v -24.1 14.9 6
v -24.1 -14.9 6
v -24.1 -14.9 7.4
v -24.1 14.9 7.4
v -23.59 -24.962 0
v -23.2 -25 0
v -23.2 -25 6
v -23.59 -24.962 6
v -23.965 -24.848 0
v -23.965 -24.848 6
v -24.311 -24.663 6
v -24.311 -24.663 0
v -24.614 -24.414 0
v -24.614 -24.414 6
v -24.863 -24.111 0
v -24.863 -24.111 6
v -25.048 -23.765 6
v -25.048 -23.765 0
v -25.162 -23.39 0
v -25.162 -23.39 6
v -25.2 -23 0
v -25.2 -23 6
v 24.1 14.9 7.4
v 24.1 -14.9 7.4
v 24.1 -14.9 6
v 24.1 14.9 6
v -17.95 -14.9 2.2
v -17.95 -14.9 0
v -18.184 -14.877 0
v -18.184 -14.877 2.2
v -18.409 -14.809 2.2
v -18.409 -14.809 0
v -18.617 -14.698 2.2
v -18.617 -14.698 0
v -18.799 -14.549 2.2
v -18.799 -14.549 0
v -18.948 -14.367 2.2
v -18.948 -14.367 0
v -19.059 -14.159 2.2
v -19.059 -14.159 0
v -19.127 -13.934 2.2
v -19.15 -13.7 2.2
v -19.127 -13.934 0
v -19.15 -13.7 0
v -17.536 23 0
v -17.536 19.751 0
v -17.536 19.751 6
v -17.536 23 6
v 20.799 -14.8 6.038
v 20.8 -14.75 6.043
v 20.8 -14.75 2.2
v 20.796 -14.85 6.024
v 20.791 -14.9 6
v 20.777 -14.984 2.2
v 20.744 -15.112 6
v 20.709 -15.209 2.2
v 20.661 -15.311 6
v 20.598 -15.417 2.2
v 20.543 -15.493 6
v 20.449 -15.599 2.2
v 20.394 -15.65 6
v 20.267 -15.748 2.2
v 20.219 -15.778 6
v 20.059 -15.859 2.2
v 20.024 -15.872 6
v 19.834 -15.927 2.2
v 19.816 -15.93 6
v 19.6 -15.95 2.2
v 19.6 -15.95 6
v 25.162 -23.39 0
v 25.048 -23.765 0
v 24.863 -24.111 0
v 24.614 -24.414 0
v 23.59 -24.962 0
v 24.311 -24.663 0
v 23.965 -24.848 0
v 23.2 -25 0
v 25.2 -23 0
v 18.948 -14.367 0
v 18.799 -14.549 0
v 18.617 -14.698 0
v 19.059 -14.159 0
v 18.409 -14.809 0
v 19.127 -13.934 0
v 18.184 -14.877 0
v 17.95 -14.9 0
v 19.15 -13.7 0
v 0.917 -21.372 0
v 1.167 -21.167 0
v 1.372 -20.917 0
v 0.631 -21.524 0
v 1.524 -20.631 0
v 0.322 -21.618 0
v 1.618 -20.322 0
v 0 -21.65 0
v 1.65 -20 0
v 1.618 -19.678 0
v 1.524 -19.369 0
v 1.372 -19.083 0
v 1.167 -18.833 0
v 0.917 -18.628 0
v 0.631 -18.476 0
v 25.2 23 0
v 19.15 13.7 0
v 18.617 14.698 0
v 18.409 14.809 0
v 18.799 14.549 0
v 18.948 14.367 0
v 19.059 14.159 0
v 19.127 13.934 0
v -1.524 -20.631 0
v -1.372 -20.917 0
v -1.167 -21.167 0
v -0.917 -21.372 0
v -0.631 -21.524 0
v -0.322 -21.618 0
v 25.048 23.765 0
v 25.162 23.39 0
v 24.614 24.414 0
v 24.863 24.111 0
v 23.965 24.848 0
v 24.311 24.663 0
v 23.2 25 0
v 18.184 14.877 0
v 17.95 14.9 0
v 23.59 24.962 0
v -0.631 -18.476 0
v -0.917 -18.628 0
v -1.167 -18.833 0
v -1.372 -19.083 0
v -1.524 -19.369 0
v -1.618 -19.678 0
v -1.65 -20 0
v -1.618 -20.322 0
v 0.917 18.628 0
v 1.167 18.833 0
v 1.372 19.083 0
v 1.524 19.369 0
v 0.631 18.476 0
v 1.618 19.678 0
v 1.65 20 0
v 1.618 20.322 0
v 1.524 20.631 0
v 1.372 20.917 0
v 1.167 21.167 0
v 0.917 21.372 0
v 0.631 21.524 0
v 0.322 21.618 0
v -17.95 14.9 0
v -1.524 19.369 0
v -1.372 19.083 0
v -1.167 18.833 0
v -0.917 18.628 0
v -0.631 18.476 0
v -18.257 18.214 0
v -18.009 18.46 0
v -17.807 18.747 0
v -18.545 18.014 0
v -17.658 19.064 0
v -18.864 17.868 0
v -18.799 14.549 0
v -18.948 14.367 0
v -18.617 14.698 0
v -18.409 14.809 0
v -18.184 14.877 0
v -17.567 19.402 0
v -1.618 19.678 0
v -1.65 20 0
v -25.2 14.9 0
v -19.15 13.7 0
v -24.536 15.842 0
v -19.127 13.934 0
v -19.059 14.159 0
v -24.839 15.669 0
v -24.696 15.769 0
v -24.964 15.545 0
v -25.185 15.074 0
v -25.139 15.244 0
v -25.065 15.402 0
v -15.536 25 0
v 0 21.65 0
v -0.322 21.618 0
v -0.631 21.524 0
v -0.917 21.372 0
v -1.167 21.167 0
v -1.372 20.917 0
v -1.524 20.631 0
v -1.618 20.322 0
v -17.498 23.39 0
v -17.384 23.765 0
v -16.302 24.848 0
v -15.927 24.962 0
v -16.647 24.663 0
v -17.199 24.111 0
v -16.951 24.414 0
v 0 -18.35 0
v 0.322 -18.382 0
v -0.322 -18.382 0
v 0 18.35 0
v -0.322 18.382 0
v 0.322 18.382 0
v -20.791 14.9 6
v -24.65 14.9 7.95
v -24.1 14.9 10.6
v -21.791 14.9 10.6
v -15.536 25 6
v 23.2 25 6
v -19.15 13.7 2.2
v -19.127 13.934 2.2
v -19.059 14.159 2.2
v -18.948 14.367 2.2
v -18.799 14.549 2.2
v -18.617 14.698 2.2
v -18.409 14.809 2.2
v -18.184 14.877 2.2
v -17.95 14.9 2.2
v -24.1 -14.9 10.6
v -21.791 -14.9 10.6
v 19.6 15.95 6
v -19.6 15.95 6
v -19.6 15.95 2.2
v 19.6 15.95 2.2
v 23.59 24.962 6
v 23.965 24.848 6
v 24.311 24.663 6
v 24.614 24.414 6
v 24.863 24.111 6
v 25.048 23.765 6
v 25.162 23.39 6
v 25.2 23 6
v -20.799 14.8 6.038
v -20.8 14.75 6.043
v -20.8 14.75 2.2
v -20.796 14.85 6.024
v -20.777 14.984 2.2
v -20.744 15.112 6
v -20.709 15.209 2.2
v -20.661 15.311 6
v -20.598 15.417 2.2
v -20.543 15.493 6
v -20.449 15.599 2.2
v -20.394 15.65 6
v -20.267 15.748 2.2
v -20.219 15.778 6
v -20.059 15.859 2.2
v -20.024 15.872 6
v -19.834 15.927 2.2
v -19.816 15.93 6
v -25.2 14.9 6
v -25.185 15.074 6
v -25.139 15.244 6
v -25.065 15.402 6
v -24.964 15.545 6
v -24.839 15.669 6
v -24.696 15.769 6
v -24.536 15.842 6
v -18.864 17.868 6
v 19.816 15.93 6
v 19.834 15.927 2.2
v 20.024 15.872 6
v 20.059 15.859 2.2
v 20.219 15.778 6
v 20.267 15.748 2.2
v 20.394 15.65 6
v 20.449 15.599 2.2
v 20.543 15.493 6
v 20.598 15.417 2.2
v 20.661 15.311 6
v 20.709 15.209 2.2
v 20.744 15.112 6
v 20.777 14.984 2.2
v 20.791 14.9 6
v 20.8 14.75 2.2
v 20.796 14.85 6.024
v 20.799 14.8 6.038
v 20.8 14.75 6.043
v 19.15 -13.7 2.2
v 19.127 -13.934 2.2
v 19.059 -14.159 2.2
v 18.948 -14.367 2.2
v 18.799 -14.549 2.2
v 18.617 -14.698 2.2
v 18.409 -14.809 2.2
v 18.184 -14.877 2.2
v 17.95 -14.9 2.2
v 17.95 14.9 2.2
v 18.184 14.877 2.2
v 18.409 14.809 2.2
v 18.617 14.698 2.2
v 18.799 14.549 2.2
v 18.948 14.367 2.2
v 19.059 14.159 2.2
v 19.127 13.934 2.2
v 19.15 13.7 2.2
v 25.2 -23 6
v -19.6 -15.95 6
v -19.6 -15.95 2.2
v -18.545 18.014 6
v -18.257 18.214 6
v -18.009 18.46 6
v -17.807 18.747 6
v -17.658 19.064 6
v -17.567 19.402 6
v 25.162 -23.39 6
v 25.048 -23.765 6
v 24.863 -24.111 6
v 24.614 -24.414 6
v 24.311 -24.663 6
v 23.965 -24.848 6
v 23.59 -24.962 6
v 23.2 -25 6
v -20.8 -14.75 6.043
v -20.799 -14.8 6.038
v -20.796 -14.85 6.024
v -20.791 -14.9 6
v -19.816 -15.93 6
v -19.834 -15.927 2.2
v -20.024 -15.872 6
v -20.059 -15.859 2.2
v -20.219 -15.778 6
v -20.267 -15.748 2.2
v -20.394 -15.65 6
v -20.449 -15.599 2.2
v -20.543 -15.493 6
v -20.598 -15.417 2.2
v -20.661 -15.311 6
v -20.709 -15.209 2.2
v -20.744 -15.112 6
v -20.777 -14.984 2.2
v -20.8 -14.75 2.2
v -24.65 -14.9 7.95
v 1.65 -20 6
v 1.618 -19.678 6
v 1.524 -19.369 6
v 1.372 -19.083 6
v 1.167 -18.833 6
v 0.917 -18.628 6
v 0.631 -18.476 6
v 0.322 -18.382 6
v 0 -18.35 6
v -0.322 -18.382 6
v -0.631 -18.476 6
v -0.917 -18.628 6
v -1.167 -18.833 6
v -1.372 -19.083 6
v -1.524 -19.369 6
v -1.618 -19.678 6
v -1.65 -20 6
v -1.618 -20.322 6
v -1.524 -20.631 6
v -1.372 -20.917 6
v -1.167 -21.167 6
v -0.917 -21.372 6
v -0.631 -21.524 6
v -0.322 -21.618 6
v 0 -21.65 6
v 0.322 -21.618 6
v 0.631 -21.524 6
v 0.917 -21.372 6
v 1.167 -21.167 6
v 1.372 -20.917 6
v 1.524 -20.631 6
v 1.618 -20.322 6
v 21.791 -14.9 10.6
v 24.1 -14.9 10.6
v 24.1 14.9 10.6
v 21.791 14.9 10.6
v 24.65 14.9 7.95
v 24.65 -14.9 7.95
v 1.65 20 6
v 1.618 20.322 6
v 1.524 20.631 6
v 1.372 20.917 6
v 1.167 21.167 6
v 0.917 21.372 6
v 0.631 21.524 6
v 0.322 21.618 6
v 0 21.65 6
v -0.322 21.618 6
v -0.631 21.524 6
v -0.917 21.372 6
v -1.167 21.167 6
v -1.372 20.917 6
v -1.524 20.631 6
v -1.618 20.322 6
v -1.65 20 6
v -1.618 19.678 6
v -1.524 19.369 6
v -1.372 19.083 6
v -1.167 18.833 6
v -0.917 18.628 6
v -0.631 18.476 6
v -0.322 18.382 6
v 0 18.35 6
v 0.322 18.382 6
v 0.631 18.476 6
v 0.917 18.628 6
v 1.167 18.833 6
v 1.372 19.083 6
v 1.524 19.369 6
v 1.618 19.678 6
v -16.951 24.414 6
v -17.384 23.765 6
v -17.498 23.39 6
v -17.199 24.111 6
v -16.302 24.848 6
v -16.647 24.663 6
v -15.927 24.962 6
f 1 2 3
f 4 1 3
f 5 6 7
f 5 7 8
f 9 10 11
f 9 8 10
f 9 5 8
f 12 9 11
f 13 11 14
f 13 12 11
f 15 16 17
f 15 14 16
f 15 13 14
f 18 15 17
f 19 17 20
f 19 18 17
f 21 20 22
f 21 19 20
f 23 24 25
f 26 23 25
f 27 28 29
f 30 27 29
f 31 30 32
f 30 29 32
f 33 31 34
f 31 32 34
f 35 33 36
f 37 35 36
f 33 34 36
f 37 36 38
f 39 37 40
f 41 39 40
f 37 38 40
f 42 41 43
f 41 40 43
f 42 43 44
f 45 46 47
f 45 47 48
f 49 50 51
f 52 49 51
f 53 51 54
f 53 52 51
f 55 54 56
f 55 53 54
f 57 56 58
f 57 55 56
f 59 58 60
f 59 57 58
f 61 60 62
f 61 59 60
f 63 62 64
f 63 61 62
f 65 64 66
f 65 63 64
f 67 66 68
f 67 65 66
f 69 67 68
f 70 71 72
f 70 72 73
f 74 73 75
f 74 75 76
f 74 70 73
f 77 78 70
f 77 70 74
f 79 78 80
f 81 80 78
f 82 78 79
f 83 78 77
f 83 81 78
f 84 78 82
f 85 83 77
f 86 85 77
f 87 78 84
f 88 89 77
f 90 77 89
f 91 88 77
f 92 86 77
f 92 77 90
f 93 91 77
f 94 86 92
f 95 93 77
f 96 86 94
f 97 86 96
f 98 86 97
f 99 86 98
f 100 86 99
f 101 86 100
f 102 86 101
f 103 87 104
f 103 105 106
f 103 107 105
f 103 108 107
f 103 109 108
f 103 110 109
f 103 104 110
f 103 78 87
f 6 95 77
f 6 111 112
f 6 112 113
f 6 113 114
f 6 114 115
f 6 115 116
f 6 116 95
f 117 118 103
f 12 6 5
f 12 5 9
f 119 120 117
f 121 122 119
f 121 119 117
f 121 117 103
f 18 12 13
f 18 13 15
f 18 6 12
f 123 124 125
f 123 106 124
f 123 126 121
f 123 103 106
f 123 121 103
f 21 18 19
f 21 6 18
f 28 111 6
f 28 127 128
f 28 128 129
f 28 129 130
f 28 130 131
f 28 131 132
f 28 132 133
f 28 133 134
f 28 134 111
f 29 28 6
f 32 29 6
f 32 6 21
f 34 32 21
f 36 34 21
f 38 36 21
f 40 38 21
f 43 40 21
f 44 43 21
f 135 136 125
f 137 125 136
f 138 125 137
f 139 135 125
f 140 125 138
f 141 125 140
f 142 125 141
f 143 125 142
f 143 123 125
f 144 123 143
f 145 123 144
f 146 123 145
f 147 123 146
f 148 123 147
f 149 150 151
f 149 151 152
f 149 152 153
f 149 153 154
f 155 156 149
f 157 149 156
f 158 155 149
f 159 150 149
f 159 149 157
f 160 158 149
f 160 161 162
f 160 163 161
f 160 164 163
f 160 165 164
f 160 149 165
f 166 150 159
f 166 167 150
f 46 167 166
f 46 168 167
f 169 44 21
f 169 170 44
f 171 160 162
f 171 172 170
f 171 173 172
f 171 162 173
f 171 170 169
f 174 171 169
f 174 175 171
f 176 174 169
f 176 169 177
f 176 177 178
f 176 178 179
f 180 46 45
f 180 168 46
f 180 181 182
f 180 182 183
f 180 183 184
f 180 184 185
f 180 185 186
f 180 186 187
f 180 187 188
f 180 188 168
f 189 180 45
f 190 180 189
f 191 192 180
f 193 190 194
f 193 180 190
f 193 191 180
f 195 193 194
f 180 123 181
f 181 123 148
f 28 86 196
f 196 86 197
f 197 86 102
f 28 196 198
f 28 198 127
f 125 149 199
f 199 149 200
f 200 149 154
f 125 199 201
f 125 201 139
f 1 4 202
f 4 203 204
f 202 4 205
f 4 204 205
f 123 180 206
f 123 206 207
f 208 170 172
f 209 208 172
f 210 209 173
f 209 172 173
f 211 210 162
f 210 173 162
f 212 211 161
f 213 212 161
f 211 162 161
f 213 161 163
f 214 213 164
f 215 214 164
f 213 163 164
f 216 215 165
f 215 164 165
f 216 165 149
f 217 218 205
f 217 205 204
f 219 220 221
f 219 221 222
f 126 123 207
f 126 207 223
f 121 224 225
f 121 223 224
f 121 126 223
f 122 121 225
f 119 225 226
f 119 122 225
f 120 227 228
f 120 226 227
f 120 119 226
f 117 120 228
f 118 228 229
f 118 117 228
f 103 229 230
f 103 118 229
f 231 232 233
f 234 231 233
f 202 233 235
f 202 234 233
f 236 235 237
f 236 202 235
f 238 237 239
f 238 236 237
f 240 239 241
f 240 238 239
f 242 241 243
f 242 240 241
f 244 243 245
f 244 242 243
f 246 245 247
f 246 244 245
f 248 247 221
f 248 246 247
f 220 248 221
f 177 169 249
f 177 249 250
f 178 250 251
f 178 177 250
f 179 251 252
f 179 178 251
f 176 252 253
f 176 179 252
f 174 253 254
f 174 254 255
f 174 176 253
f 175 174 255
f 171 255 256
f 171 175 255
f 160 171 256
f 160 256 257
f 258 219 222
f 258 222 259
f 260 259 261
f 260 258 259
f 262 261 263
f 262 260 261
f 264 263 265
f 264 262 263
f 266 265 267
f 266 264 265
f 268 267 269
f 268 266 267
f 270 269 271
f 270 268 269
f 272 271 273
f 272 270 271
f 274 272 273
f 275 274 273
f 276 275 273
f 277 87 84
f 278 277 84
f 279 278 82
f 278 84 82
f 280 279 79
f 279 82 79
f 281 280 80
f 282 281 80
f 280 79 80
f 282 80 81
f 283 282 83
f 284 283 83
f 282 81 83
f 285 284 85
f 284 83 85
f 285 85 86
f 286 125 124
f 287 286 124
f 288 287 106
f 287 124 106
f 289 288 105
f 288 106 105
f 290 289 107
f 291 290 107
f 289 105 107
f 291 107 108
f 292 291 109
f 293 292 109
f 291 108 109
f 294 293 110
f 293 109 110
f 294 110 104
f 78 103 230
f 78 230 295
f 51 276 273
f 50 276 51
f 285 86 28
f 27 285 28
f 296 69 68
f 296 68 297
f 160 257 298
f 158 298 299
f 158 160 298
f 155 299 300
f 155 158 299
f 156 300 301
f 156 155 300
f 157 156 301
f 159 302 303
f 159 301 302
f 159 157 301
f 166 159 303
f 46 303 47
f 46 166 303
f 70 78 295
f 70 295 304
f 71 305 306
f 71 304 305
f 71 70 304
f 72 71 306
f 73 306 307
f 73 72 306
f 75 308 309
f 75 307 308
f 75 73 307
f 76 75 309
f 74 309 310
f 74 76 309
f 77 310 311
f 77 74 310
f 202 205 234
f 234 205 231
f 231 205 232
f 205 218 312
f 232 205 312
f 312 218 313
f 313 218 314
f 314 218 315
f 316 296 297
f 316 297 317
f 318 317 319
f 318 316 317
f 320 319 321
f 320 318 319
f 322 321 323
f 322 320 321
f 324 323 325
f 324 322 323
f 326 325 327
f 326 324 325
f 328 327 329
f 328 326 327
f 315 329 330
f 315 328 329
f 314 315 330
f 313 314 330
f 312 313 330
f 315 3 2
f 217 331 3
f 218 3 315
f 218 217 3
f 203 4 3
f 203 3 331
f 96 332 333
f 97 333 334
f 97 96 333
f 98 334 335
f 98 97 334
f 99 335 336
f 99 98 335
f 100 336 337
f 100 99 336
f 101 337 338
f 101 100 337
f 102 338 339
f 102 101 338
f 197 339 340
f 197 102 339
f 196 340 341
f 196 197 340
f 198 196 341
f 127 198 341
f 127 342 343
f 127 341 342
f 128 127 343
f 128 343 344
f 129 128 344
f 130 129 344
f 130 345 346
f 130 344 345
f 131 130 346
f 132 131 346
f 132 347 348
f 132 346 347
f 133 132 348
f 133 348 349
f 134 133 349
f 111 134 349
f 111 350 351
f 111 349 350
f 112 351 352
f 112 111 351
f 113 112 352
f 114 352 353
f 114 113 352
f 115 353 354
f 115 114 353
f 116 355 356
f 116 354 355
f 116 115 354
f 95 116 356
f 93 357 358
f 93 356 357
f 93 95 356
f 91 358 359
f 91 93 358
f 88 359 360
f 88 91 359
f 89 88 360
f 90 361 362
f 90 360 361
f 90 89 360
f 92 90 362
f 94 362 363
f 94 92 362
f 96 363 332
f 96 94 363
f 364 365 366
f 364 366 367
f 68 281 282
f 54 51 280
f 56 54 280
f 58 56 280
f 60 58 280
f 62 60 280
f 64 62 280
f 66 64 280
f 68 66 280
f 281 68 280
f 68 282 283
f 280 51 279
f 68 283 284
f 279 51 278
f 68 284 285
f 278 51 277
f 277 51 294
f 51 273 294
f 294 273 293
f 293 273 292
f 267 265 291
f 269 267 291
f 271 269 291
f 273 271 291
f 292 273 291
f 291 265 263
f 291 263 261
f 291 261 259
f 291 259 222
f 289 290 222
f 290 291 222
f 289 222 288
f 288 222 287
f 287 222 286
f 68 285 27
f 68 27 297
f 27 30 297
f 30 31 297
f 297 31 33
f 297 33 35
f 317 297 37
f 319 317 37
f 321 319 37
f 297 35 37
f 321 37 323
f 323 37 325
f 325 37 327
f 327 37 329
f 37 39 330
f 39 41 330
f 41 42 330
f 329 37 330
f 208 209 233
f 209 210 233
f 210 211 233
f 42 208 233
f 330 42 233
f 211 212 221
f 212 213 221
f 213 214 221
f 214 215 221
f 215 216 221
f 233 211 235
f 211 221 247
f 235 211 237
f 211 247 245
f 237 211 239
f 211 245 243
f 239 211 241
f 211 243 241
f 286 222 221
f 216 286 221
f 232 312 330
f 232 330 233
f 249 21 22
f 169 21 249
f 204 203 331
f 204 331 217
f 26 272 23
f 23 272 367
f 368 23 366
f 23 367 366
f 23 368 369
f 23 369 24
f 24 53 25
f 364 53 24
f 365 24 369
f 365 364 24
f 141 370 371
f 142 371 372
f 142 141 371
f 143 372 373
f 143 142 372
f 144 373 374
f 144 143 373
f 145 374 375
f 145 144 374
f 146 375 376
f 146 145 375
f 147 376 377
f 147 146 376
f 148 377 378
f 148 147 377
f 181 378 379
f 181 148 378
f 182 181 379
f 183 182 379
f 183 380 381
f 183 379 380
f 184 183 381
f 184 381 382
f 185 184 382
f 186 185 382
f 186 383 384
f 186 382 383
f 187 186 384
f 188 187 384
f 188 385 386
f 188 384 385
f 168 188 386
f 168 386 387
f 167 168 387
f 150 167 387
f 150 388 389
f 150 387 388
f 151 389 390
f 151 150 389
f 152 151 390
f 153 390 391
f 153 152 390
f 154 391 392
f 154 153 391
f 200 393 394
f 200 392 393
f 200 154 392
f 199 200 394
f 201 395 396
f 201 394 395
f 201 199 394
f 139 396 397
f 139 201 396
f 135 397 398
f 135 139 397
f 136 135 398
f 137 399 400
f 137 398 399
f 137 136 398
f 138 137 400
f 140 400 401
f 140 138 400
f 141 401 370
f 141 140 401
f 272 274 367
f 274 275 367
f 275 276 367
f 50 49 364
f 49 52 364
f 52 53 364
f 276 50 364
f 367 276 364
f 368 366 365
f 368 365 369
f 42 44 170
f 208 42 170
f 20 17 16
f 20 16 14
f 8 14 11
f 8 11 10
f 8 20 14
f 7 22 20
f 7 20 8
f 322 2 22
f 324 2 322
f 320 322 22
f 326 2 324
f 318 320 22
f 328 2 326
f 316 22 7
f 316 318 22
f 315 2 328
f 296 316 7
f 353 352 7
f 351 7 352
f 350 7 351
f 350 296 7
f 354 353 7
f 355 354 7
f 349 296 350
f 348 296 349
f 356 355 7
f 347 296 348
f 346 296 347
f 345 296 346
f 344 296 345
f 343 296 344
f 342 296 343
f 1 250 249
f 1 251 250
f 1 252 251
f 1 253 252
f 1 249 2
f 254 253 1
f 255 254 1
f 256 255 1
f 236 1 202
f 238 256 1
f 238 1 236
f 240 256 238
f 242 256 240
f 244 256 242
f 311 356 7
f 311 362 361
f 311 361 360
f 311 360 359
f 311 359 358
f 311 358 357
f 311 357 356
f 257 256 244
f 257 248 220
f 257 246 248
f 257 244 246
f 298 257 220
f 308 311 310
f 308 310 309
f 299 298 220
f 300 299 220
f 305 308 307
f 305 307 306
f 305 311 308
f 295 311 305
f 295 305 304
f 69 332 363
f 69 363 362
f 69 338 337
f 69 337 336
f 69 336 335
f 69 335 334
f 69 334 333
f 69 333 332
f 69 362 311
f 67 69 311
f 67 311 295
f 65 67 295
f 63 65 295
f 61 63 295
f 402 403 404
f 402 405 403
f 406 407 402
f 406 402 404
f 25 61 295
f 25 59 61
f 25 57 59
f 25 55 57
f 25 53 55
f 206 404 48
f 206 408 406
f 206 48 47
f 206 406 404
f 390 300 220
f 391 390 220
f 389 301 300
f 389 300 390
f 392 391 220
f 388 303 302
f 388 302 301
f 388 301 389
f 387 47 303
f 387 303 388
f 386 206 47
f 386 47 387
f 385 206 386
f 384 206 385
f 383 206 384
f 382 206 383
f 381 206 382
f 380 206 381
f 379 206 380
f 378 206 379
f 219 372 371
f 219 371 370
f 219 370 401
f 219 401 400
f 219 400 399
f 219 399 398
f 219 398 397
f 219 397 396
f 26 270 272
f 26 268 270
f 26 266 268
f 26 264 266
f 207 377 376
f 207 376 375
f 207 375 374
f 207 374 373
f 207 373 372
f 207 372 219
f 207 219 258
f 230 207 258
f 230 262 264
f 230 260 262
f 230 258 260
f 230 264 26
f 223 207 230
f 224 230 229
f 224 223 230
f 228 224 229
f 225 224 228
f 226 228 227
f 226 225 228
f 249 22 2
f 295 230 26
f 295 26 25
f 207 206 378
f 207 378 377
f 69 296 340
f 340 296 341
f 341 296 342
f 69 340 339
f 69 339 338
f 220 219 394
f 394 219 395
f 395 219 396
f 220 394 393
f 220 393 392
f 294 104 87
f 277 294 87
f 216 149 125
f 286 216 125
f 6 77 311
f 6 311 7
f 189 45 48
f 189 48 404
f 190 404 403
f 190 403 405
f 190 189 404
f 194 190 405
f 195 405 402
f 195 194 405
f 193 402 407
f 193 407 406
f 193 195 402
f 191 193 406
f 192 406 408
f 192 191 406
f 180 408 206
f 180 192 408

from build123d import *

# Parameters (mm, degrees)
SKETCH1_R           = 1.65
BOSS_EXTRUDE1_DEPTH = 10.6
SKETCH2_OUTSIDE_W   = 66.756
SKETCH2_OUTSIDE_H   = 66.356
SKETCH2_OUTSIDE_W_2 = 50.4
SKETCH2_OUTSIDE_H_2 = 29.8
CUT_EXTRUDE1_DEPTH  = 4.6
CUT_EXTRUDE2_DEPTH  = 8.4
SKETCH4_OUTSIDE_W   = 66.756
SKETCH4_OUTSIDE_H   = 26.956
CUT_EXTRUDE3_DEPTH  = 50


with BuildPart() as part:
    # Sketch1 → Boss-Extrude1 (new body)
    with BuildSketch(Plane.XY):
        with BuildLine():
            Line((-17.536336397, 19.751180304), (-17.536336397, 23))
            ThreePointArc((-17.536336397, 23), (-16.950549959, 24.414213562), (-15.536336397, 25))
            Line((-15.536336397, 25), (23.2, 25))
            ThreePointArc((23.2, 25), (24.614213562, 24.414213562), (25.2, 23))
            Line((25.2, 23), (25.2, -23))
            ThreePointArc((25.2, -23), (24.614213562, -24.414213562), (23.2, -25))
            Line((23.2, -25), (-23.2, -25))
            ThreePointArc((-23.2, -25), (-24.614213562, -24.414213562), (-25.2, -23))
            Line((-25.2, -23), (-25.2, 14.9))
            ThreePointArc((-25.2, 14.9), (-25.01741556, 15.476048437), (-24.536336397, 15.841741912))
            Line((-24.536336397, 15.841741912), (-18.863663603, 17.867696481))
            ThreePointArc((-18.863663603, 17.867696481), (-17.901505276, 18.599083431), (-17.536336397, 19.751180304))
        make_face()
        with Locations((0, 20)):
            Circle(SKETCH1_R, mode=Mode.SUBTRACT)
        with Locations((0, -20)):
            Circle(SKETCH1_R, mode=Mode.SUBTRACT)
        with BuildLine():
            Line((-19.15, -13.7), (-19.15, 13.7))
            ThreePointArc((-19.15, 13.7), (-18.798528137, 14.548528137), (-17.95, 14.9))
            Line((-17.95, 14.9), (17.95, 14.9))
            ThreePointArc((17.95, 14.9), (18.798528137, 14.548528137), (19.15, 13.7))
            Line((19.15, 13.7), (19.15, -13.7))
            ThreePointArc((19.15, -13.7), (18.798528137, -14.548528137), (17.95, -14.9))
            Line((17.95, -14.9), (-17.95, -14.9))
            ThreePointArc((-17.95, -14.9), (-18.798528137, -14.548528137), (-19.15, -13.7))
        make_face(mode=Mode.SUBTRACT)
    extrude(amount=BOSS_EXTRUDE1_DEPTH)

    # Sketch2 outside → Cut-Extrude1 (cut)
    with BuildSketch(Plane.XY.offset(10.6)):
        Rectangle(SKETCH2_OUTSIDE_W, SKETCH2_OUTSIDE_H)
        Rectangle(SKETCH2_OUTSIDE_W_2, SKETCH2_OUTSIDE_H_2, mode=Mode.SUBTRACT)
    extrude(amount=-CUT_EXTRUDE1_DEPTH, mode=Mode.SUBTRACT)

    # Sketch3 → Cut-Extrude2 (cut)
    with BuildSketch(Plane.XY.offset(10.6)):
        with BuildLine():
            Line((-20.8, -14.75), (-20.8, 14.75))
            ThreePointArc((-20.8, 14.75), (-20.448528137, 15.598528137), (-19.6, 15.95))
            Line((-19.6, 15.95), (19.6, 15.95))
            ThreePointArc((19.6, 15.95), (20.448528137, 15.598528137), (20.8, 14.75))
            Line((20.8, 14.75), (20.8, -14.75))
            ThreePointArc((20.8, -14.75), (20.448528137, -15.598528137), (19.6, -15.95))
            Line((19.6, -15.95), (-19.6, -15.95))
            ThreePointArc((-19.6, -15.95), (-20.448528137, -15.598528137), (-20.8, -14.75))
        make_face()
    extrude(amount=-CUT_EXTRUDE2_DEPTH, mode=Mode.SUBTRACT)

    # Sketch4 outside → Cut-Extrude3 (cut)
    with BuildSketch(Plane.XZ.offset(25)):
        with Locations((0, 5.3)):
            Rectangle(SKETCH4_OUTSIDE_W, SKETCH4_OUTSIDE_H)
        Polygon((-24.1, 7.4), (-24.65, 7.95), (-24.1, 10.6), (-21.79058809, 10.6), (-20.79058809, 6), (20.79058809, 6), (21.79058809, 10.6), (24.1, 10.6), (24.65, 7.95), (24.1, 7.4), (24.1, 6), (25.2, 6), (25.2, 0), (-25.2, 0), (-25.2, 6), (-24.1, 6), align=None, mode=Mode.SUBTRACT)
    extrude(amount=-CUT_EXTRUDE3_DEPTH, mode=Mode.SUBTRACT)


solid = part.part
